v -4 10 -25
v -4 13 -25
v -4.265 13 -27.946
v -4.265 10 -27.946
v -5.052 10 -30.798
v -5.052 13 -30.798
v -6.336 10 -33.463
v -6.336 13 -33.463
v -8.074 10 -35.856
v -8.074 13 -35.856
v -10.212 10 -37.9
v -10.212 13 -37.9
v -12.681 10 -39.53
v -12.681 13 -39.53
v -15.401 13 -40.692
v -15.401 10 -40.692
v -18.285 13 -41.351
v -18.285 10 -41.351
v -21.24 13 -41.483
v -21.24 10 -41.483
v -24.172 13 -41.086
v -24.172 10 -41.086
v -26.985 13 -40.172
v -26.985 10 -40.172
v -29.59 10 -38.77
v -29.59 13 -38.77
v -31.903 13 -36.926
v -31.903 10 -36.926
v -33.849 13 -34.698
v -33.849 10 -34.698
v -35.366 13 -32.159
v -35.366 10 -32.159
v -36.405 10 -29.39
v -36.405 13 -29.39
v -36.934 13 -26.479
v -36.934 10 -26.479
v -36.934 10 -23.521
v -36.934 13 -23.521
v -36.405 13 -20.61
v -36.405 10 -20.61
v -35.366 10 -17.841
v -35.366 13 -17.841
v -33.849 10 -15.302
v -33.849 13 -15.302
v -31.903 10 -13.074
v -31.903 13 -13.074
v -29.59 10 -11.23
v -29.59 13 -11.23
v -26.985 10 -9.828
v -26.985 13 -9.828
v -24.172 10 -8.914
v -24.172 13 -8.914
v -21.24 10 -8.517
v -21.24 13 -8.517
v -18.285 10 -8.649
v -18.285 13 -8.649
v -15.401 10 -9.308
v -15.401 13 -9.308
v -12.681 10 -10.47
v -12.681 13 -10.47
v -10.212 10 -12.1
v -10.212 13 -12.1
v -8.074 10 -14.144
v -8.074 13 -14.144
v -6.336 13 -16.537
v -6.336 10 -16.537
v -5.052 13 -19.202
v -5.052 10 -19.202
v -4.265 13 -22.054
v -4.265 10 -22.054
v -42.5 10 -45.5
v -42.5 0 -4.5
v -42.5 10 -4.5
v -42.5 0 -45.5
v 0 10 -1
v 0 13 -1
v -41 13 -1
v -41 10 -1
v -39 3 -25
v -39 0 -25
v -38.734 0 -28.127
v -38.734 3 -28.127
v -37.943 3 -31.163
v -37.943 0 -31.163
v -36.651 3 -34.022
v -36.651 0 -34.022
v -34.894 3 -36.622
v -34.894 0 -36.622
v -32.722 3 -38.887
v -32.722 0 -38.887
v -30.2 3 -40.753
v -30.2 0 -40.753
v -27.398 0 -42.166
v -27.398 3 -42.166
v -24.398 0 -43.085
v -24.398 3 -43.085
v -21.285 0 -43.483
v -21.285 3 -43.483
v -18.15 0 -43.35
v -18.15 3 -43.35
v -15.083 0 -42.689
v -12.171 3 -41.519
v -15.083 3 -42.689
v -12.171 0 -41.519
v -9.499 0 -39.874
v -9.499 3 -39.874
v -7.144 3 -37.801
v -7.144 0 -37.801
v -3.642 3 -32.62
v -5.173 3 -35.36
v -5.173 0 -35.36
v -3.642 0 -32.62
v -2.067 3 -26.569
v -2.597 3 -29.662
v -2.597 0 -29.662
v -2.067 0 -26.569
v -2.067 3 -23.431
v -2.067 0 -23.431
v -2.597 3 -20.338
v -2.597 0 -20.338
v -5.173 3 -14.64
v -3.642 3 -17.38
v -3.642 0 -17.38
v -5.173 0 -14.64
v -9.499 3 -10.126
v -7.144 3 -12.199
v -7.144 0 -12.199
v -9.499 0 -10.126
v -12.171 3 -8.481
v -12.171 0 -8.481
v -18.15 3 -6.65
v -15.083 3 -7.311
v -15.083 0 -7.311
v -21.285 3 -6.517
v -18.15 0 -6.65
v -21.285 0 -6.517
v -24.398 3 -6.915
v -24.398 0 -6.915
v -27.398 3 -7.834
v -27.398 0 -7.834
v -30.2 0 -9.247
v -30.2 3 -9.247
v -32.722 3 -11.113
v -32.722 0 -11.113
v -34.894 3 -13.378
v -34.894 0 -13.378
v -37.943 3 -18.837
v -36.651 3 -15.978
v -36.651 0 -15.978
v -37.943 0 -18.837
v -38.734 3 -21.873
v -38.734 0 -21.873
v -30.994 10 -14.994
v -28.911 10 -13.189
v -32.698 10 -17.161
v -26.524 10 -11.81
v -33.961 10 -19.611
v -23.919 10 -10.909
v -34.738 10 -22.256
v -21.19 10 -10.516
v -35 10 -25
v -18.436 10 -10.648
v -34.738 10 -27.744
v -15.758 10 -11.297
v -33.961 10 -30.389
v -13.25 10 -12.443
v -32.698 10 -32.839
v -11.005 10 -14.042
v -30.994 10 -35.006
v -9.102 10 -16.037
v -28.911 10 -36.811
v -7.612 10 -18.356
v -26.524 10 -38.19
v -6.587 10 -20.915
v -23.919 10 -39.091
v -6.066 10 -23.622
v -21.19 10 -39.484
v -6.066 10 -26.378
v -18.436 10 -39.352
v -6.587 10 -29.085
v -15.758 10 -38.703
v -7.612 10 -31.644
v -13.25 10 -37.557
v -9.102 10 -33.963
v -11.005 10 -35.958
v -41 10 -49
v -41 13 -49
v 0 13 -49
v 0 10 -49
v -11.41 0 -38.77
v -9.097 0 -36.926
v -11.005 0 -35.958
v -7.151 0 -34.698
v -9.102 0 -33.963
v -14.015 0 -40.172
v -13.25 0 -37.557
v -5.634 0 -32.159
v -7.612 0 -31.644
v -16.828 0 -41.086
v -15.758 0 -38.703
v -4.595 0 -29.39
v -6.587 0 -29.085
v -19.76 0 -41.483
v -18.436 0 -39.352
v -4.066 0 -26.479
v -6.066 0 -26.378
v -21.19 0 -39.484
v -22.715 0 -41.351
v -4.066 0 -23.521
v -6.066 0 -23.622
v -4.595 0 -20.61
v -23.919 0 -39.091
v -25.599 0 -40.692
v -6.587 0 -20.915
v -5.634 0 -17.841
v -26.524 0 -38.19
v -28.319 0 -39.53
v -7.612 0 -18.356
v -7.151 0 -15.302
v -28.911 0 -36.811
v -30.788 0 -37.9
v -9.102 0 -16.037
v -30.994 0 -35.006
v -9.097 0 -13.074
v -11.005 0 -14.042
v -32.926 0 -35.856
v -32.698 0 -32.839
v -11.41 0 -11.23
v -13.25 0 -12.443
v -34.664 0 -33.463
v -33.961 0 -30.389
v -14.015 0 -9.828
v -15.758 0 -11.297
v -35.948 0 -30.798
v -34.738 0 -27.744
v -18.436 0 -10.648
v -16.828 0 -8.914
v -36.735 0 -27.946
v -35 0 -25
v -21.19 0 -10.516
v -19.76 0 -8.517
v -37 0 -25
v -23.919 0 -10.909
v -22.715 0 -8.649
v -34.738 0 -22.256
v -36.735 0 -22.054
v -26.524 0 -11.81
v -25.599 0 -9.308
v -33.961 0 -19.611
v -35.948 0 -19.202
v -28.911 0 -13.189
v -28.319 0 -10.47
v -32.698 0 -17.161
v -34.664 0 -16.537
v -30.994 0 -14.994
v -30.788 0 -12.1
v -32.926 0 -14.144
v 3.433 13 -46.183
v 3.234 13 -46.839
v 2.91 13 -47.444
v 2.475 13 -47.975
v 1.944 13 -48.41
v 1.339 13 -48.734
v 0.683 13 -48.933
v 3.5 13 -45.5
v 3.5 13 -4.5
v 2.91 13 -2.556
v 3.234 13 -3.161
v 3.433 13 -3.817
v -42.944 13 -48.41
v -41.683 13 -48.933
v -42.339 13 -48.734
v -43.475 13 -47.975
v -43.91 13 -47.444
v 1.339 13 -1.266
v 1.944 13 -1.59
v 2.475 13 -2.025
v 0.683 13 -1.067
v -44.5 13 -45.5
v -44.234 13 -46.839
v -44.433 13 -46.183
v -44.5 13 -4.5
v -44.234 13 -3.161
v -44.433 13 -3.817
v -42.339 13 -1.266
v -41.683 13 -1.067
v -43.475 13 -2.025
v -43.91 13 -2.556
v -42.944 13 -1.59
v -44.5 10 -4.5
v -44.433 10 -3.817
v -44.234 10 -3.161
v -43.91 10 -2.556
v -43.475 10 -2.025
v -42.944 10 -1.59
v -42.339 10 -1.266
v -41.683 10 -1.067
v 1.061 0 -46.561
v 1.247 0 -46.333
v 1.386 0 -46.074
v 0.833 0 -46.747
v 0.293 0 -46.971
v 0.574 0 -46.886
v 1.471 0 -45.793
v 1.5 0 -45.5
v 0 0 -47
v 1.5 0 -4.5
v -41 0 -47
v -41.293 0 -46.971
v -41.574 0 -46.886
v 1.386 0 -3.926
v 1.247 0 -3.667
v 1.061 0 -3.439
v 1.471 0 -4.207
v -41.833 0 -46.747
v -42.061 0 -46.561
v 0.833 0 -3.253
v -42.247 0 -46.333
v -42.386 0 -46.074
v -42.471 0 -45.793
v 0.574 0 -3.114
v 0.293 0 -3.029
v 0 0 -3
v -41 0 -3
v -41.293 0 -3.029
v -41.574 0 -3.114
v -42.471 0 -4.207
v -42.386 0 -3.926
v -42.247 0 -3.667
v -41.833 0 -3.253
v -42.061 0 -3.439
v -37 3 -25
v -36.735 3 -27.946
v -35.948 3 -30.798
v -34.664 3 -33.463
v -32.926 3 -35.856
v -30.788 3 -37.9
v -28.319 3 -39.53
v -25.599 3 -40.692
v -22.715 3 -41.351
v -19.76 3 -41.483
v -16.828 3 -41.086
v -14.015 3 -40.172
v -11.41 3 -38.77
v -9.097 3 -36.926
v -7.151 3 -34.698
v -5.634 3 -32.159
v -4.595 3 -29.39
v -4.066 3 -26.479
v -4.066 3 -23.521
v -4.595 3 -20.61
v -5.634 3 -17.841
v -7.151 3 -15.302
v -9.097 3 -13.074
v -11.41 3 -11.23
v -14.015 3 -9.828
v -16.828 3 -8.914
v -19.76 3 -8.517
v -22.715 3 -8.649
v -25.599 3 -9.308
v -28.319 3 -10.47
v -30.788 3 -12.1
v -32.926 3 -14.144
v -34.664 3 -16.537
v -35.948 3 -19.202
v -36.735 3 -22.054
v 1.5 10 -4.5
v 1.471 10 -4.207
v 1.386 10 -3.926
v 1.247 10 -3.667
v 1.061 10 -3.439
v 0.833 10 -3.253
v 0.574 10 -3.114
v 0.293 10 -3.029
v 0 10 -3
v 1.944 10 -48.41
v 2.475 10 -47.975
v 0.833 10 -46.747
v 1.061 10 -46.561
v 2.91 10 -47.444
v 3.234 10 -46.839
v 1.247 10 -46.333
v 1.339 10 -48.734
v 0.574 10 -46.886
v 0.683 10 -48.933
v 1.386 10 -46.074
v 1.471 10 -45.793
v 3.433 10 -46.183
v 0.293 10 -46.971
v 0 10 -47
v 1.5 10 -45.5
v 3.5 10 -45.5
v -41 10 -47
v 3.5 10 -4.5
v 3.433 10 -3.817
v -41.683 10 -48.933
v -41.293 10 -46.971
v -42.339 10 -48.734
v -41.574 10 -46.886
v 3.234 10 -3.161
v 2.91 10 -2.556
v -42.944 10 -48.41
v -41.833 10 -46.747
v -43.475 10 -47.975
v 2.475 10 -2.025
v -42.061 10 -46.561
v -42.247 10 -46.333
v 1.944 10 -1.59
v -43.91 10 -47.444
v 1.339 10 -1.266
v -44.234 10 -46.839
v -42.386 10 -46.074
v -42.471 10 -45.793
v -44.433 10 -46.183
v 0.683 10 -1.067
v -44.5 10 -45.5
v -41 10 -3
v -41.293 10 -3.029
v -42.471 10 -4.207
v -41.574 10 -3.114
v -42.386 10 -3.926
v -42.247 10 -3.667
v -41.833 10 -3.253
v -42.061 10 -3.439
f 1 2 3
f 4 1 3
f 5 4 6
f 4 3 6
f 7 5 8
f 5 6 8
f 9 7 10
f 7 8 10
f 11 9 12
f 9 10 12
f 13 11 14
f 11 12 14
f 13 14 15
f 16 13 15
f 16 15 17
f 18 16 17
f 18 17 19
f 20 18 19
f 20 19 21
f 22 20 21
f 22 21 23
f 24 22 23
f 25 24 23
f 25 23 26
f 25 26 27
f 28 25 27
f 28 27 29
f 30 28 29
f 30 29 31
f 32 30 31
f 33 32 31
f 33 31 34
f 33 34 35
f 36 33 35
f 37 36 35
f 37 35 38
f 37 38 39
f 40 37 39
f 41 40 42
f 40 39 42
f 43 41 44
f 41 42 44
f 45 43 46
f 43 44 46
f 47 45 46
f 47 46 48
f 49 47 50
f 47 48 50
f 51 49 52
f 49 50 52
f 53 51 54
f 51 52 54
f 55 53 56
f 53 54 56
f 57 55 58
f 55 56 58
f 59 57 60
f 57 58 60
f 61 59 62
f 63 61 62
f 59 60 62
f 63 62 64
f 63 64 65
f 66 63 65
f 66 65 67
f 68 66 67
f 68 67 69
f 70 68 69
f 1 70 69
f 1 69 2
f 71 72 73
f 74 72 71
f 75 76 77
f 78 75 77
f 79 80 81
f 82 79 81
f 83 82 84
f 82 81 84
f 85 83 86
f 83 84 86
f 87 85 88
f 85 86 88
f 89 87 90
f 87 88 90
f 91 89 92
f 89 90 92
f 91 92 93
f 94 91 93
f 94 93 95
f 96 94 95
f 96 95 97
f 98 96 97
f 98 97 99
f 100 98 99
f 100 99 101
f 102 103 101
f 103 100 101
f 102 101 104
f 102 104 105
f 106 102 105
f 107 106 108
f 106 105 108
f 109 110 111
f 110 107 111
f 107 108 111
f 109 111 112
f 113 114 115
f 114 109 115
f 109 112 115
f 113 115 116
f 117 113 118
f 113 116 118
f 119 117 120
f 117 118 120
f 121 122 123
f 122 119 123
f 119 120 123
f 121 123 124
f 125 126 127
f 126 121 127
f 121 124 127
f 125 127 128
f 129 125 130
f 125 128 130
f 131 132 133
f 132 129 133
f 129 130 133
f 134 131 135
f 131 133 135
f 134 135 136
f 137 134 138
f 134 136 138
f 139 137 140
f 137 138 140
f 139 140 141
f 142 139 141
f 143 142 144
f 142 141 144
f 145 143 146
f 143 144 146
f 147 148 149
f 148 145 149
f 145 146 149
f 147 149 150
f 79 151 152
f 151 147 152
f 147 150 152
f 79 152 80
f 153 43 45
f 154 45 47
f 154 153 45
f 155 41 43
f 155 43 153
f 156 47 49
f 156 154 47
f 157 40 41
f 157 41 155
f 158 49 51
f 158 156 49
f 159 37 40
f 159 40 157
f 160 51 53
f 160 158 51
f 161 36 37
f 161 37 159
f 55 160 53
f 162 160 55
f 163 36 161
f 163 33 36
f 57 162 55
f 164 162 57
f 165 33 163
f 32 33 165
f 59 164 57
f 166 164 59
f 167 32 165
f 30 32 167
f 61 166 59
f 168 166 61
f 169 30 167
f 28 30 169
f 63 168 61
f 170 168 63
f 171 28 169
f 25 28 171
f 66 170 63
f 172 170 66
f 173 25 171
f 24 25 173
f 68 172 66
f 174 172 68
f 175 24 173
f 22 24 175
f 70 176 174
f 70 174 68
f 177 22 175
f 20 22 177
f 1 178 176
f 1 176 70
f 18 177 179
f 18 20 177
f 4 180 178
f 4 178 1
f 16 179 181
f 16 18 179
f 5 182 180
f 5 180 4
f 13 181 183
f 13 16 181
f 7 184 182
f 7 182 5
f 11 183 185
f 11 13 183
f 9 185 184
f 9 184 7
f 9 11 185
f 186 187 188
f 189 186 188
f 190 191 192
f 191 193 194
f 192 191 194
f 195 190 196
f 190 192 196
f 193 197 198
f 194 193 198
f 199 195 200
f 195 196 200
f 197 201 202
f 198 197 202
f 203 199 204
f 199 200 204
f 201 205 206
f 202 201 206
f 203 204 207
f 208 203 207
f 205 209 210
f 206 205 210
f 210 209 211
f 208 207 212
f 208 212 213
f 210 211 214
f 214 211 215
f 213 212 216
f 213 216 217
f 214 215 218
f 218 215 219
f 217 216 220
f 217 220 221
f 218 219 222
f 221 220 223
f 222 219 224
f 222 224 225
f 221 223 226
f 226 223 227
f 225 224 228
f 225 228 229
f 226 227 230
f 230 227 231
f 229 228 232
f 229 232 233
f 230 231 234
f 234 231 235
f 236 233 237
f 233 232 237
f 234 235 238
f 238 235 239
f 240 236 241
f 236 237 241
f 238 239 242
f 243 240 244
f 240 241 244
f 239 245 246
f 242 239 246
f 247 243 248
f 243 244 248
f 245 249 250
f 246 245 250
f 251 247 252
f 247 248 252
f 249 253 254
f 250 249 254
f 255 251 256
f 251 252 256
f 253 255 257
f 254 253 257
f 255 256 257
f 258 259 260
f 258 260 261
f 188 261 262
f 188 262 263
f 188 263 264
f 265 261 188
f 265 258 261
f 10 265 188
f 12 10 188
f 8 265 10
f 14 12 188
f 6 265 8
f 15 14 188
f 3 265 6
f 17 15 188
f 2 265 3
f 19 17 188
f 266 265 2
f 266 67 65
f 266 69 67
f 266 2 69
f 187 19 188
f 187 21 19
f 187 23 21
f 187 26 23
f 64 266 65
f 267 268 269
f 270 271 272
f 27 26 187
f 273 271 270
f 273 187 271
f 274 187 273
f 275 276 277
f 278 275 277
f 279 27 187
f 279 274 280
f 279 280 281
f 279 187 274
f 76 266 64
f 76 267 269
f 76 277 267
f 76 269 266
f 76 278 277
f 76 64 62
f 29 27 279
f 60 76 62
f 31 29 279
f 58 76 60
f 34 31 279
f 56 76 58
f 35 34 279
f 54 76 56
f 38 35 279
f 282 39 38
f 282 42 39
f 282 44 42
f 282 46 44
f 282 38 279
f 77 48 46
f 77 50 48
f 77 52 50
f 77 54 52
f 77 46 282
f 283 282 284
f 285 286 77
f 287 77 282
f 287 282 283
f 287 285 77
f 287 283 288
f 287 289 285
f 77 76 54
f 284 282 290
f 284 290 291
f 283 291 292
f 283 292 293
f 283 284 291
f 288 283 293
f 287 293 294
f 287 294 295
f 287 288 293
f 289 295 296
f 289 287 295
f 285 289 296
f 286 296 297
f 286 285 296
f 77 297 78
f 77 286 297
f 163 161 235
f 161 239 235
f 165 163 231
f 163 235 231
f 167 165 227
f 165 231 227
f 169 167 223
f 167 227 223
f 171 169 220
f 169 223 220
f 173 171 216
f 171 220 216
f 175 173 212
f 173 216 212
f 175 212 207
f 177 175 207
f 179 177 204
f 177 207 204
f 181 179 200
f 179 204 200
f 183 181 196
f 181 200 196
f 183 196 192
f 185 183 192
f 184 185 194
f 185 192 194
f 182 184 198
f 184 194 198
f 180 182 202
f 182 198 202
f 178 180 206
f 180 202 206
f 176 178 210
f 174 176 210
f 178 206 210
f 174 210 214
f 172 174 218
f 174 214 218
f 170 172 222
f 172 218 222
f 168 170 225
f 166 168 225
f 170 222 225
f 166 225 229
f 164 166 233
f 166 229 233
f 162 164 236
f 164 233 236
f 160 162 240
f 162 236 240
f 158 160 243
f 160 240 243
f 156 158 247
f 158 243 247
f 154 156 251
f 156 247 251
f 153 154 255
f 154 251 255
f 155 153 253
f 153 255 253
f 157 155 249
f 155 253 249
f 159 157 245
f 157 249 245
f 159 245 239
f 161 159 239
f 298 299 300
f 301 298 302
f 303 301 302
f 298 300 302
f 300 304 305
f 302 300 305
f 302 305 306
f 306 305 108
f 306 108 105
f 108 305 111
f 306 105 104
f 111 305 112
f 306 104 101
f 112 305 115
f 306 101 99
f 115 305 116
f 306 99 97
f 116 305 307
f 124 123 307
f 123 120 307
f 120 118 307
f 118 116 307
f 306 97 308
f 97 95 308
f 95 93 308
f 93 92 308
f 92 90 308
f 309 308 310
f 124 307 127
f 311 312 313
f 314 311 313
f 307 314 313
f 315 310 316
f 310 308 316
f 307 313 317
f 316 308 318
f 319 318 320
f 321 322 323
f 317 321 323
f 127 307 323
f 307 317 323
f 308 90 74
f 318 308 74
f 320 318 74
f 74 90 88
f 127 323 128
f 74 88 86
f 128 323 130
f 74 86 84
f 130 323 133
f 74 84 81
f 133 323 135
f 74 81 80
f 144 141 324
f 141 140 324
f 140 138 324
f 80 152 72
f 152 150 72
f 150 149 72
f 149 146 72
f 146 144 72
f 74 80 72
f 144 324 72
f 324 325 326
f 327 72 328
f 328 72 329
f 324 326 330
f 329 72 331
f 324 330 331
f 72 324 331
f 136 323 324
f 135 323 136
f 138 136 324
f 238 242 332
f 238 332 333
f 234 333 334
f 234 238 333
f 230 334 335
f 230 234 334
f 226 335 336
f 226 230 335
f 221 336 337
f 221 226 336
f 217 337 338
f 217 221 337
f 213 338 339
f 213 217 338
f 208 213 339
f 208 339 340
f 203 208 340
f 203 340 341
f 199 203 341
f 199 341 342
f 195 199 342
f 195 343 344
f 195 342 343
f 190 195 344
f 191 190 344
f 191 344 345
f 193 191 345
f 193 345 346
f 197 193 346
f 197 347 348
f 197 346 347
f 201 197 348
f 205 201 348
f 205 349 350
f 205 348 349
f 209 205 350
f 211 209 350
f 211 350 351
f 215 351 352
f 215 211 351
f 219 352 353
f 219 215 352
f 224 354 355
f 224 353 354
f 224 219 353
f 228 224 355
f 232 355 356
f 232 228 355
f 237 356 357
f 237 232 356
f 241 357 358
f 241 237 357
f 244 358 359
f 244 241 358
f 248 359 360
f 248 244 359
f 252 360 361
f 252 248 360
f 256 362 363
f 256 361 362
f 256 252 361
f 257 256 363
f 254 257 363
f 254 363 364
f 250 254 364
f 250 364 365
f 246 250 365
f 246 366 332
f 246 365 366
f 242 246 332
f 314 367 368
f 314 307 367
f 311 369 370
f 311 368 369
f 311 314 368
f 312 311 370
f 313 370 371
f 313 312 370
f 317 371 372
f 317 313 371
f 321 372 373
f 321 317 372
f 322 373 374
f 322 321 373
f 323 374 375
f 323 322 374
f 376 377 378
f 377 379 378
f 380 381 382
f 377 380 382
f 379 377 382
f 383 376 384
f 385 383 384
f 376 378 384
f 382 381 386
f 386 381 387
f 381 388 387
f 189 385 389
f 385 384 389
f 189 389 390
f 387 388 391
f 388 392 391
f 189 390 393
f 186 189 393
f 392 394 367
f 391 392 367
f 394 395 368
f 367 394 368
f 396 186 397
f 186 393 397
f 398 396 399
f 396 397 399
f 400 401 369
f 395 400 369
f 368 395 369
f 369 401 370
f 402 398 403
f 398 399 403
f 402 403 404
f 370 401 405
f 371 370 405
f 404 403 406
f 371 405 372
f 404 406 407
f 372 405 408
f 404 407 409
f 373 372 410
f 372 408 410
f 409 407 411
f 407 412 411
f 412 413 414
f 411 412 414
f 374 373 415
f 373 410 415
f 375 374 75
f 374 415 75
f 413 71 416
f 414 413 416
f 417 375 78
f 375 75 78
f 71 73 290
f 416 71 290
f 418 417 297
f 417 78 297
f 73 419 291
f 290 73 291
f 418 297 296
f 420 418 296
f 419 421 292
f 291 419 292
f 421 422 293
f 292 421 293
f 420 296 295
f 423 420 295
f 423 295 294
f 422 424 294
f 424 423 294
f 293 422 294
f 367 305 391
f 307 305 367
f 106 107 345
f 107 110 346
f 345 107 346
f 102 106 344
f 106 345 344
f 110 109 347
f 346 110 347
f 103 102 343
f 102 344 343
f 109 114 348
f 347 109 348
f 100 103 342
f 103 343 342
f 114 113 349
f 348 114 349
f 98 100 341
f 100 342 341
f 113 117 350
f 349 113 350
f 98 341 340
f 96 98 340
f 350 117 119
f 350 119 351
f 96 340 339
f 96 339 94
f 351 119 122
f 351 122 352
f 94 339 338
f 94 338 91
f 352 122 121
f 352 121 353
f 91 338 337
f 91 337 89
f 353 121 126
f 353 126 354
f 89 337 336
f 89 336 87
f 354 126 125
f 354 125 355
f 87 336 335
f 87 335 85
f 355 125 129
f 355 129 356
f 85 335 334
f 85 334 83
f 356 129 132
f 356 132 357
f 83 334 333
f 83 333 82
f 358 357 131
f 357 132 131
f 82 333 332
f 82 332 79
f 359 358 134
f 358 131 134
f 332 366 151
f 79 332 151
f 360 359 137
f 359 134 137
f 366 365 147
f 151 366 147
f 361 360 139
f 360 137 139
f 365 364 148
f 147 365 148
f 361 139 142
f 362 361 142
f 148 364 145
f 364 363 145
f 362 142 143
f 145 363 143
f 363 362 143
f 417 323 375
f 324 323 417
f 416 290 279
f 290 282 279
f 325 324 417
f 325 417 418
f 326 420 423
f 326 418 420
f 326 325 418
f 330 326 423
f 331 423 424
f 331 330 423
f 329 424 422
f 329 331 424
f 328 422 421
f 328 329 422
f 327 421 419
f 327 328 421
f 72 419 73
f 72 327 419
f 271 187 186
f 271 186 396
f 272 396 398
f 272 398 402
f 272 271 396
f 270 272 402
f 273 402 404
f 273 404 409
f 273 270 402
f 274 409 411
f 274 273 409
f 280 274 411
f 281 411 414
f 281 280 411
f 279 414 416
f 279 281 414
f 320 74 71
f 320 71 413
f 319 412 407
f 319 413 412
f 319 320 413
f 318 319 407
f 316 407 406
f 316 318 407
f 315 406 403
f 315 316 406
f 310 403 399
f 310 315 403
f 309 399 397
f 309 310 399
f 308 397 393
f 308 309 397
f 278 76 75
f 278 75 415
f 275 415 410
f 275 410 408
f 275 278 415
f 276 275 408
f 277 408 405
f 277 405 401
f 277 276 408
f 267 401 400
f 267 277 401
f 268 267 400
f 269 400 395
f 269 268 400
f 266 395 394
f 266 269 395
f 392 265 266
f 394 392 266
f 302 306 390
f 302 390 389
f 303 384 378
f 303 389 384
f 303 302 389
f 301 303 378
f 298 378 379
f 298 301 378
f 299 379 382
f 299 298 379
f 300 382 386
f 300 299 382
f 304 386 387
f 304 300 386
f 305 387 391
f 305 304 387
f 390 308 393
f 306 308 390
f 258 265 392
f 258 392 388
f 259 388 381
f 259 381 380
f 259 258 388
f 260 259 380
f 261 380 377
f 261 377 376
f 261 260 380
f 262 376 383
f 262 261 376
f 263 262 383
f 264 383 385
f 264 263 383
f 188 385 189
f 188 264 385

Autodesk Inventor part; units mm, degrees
ref_plane "YZ Plane" through (0, 0, 0) normal (1, 0, 0) x (0, 1, 0)
ref_plane "XZ Plane" through (0, 0, 0) normal (0, 1, 0) x (-1, 0, 0)
ref_plane "XY Plane" through (0, 0, 0) normal (0, 0, 1) x (1, 0, 0)
sketch "Эскиз1" plane through (0, 0, 0) normal (0, 1, 0) x (-1, 0, 0)
  arc A0 (41, -50) -> (45.5, -45.5) centre (41, -45.5) ccw
  line L0 (0, -50) -> (41, -50)
  arc A1 (-4.5, -45.5) -> (0, -50) centre (0, -45.5) ccw
  line L1 (-4.5, -4.5) -> (-4.5, -45.5)
  arc A2 (0, 0) -> (-4.5, -4.5) centre (0, -4.5) ccw
  line L2 (-1.5, -45.5) -> (-1.5, -4.5)
  arc A3 (0, -3) -> (-1.5, -4.5) centre (0, -4.5) ccw
  line L3 (0, -3) -> (41, -3)
  line L4 (41, 0) -> (0, 0)
  arc A4 (45.5, -4.5) -> (41, 0) centre (41, -4.5) ccw
  line L5 (45.5, -45.5) -> (45.5, -4.5)
  line L6 (42.5, -4.5) -> (42.5, -45.5)
  arc A5 (42.5, -4.5) -> (41, -3) centre (41, -4.5) ccw
  line L7 (41, -47) -> (0, -47)
  arc A6 (41, -47) -> (42.5, -45.5) centre (41, -45.5) ccw
  arc A7 (-1.5, -45.5) -> (0, -47) centre (0, -45.5) ccw
  circle A8 centre (20.5, -25) radius 18.5
  circle A9 centre (20.5, -25) radius 16.5
  circle A10 centre (20.5, -25) radius 14.5
  circle A11 centre (20.5, -25) radius 13.5
  point P0 (11.5, -30)
extrude "Выдавливание1" add sketch "Эскиз1" along normal blind 10 contours L2 A3 L3 A5 L6 A6 L7 A7 | A8 | A9 | A10 | A11
extrude "Выдавливание2" cut sketch "Эскиз1" along normal blind 3 contours A8 | A10
extrude "Выдавливание3" cut sketch "Эскиз1" along normal blind 14.75 contours A10 | A11
extrude "Выдавливание4" add sketch "Эскиз1" along normal blind 13 contours L0 A1 L1 A2 L4 A4 L5 A0
extrude "Выдавливание5" add sketch "Эскиз1" along normal blind 13 contours L2 A3 L3 A5 L6 A6 L7 A7 | A8 | A9 | A10 | A11
extrude "Выдавливание6" cut sketch "Эскиз1" along normal blind 10 contours L0 A1 L1 A2 L4 A4 L5 A0
extrude "Выдавливание7" cut sketch "Эскиз1" along normal blind 3 contours A8 | A10
extrude "Выдавливание8" cut sketch "Эскиз1" along normal blind 15 contours A10 | A11
sketch "Эскиз2" plane through (0, 13, 0) normal (0, 1, 0) x (1, 0, 0)
  circle A0 centre (-20.5, 25) radius 14.5 projected
  line L0 (-45.5, 45.5) -> (-45.5, 4.5) projected
  arc A1 (-45.5, 4.5) -> (-41, 0) centre (-41, 4.5) ccw projected
  line L1 (-41, 0) -> (0, 0) projected
  arc A2 (0, 0) -> (4.5, 4.5) centre (0, 4.5) ccw projected
  line L2 (4.5, 4.5) -> (4.5, 45.5) projected
  arc A3 (4.5, 45.5) -> (0, 50) centre (0, 45.5) ccw projected
  line L3 (0, 50) -> (-41, 50) projected
  arc A4 (-41, 50) -> (-45.5, 45.5) centre (-41, 45.5) ccw projected
  circle A5 centre (-20.5, 25) radius 16.5
extrude "Выдавливание9" cut sketch "Эскиз2" against normal blind 3 contours A5
sketch "Эскиз3" plane through (0, 13, 0) normal (0, 1, 0) x (1, 0, 0)
  circle A0 centre (-20.5, 25) radius 16.5 projected
  line L0 (-45.5, 45.5) -> (-45.5, 4.5) projected
  arc A1 (-45.5, 4.5) -> (-41, 0) centre (-41, 4.5) ccw projected
  line L1 (-41, 0) -> (0, 0) projected
  arc A2 (0, 0) -> (4.5, 4.5) centre (0, 4.5) ccw projected
  line L2 (4.5, 4.5) -> (4.5, 45.5) projected
  arc A3 (4.5, 45.5) -> (0, 50) centre (0, 45.5) ccw projected
  line L3 (0, 50) -> (-41, 50) projected
  arc A4 (-41, 50) -> (-45.5, 45.5) centre (-41, 45.5) ccw projected
  line L4 (-41, 49) -> (0, 49)
  arc A5 (3.5, 45.5) -> (0, 49) centre (0, 45.5) ccw
  line L5 (3.5, 45.5) -> (3.5, 4.5)
  arc A6 (0, 1) -> (3.5, 4.5) centre (0, 4.5) ccw
  line L6 (0, 1) -> (-41, 1)
  arc A7 (-44.5, 4.5) -> (-41, 1) centre (-41, 4.5) ccw
  line L7 (-44.5, 4.5) -> (-44.5, 45.5)
  arc A8 (-41, 49) -> (-44.5, 45.5) centre (-41, 45.5) ccw
  dimension "d18" = 1
extrude "Выдавливание10" cut sketch "Эскиз3" against normal blind 3 contours A4 L3 A3 L2 A2 L1 A1 L0
properties part number "Cap_top" material "Стекло, литое, серое"
